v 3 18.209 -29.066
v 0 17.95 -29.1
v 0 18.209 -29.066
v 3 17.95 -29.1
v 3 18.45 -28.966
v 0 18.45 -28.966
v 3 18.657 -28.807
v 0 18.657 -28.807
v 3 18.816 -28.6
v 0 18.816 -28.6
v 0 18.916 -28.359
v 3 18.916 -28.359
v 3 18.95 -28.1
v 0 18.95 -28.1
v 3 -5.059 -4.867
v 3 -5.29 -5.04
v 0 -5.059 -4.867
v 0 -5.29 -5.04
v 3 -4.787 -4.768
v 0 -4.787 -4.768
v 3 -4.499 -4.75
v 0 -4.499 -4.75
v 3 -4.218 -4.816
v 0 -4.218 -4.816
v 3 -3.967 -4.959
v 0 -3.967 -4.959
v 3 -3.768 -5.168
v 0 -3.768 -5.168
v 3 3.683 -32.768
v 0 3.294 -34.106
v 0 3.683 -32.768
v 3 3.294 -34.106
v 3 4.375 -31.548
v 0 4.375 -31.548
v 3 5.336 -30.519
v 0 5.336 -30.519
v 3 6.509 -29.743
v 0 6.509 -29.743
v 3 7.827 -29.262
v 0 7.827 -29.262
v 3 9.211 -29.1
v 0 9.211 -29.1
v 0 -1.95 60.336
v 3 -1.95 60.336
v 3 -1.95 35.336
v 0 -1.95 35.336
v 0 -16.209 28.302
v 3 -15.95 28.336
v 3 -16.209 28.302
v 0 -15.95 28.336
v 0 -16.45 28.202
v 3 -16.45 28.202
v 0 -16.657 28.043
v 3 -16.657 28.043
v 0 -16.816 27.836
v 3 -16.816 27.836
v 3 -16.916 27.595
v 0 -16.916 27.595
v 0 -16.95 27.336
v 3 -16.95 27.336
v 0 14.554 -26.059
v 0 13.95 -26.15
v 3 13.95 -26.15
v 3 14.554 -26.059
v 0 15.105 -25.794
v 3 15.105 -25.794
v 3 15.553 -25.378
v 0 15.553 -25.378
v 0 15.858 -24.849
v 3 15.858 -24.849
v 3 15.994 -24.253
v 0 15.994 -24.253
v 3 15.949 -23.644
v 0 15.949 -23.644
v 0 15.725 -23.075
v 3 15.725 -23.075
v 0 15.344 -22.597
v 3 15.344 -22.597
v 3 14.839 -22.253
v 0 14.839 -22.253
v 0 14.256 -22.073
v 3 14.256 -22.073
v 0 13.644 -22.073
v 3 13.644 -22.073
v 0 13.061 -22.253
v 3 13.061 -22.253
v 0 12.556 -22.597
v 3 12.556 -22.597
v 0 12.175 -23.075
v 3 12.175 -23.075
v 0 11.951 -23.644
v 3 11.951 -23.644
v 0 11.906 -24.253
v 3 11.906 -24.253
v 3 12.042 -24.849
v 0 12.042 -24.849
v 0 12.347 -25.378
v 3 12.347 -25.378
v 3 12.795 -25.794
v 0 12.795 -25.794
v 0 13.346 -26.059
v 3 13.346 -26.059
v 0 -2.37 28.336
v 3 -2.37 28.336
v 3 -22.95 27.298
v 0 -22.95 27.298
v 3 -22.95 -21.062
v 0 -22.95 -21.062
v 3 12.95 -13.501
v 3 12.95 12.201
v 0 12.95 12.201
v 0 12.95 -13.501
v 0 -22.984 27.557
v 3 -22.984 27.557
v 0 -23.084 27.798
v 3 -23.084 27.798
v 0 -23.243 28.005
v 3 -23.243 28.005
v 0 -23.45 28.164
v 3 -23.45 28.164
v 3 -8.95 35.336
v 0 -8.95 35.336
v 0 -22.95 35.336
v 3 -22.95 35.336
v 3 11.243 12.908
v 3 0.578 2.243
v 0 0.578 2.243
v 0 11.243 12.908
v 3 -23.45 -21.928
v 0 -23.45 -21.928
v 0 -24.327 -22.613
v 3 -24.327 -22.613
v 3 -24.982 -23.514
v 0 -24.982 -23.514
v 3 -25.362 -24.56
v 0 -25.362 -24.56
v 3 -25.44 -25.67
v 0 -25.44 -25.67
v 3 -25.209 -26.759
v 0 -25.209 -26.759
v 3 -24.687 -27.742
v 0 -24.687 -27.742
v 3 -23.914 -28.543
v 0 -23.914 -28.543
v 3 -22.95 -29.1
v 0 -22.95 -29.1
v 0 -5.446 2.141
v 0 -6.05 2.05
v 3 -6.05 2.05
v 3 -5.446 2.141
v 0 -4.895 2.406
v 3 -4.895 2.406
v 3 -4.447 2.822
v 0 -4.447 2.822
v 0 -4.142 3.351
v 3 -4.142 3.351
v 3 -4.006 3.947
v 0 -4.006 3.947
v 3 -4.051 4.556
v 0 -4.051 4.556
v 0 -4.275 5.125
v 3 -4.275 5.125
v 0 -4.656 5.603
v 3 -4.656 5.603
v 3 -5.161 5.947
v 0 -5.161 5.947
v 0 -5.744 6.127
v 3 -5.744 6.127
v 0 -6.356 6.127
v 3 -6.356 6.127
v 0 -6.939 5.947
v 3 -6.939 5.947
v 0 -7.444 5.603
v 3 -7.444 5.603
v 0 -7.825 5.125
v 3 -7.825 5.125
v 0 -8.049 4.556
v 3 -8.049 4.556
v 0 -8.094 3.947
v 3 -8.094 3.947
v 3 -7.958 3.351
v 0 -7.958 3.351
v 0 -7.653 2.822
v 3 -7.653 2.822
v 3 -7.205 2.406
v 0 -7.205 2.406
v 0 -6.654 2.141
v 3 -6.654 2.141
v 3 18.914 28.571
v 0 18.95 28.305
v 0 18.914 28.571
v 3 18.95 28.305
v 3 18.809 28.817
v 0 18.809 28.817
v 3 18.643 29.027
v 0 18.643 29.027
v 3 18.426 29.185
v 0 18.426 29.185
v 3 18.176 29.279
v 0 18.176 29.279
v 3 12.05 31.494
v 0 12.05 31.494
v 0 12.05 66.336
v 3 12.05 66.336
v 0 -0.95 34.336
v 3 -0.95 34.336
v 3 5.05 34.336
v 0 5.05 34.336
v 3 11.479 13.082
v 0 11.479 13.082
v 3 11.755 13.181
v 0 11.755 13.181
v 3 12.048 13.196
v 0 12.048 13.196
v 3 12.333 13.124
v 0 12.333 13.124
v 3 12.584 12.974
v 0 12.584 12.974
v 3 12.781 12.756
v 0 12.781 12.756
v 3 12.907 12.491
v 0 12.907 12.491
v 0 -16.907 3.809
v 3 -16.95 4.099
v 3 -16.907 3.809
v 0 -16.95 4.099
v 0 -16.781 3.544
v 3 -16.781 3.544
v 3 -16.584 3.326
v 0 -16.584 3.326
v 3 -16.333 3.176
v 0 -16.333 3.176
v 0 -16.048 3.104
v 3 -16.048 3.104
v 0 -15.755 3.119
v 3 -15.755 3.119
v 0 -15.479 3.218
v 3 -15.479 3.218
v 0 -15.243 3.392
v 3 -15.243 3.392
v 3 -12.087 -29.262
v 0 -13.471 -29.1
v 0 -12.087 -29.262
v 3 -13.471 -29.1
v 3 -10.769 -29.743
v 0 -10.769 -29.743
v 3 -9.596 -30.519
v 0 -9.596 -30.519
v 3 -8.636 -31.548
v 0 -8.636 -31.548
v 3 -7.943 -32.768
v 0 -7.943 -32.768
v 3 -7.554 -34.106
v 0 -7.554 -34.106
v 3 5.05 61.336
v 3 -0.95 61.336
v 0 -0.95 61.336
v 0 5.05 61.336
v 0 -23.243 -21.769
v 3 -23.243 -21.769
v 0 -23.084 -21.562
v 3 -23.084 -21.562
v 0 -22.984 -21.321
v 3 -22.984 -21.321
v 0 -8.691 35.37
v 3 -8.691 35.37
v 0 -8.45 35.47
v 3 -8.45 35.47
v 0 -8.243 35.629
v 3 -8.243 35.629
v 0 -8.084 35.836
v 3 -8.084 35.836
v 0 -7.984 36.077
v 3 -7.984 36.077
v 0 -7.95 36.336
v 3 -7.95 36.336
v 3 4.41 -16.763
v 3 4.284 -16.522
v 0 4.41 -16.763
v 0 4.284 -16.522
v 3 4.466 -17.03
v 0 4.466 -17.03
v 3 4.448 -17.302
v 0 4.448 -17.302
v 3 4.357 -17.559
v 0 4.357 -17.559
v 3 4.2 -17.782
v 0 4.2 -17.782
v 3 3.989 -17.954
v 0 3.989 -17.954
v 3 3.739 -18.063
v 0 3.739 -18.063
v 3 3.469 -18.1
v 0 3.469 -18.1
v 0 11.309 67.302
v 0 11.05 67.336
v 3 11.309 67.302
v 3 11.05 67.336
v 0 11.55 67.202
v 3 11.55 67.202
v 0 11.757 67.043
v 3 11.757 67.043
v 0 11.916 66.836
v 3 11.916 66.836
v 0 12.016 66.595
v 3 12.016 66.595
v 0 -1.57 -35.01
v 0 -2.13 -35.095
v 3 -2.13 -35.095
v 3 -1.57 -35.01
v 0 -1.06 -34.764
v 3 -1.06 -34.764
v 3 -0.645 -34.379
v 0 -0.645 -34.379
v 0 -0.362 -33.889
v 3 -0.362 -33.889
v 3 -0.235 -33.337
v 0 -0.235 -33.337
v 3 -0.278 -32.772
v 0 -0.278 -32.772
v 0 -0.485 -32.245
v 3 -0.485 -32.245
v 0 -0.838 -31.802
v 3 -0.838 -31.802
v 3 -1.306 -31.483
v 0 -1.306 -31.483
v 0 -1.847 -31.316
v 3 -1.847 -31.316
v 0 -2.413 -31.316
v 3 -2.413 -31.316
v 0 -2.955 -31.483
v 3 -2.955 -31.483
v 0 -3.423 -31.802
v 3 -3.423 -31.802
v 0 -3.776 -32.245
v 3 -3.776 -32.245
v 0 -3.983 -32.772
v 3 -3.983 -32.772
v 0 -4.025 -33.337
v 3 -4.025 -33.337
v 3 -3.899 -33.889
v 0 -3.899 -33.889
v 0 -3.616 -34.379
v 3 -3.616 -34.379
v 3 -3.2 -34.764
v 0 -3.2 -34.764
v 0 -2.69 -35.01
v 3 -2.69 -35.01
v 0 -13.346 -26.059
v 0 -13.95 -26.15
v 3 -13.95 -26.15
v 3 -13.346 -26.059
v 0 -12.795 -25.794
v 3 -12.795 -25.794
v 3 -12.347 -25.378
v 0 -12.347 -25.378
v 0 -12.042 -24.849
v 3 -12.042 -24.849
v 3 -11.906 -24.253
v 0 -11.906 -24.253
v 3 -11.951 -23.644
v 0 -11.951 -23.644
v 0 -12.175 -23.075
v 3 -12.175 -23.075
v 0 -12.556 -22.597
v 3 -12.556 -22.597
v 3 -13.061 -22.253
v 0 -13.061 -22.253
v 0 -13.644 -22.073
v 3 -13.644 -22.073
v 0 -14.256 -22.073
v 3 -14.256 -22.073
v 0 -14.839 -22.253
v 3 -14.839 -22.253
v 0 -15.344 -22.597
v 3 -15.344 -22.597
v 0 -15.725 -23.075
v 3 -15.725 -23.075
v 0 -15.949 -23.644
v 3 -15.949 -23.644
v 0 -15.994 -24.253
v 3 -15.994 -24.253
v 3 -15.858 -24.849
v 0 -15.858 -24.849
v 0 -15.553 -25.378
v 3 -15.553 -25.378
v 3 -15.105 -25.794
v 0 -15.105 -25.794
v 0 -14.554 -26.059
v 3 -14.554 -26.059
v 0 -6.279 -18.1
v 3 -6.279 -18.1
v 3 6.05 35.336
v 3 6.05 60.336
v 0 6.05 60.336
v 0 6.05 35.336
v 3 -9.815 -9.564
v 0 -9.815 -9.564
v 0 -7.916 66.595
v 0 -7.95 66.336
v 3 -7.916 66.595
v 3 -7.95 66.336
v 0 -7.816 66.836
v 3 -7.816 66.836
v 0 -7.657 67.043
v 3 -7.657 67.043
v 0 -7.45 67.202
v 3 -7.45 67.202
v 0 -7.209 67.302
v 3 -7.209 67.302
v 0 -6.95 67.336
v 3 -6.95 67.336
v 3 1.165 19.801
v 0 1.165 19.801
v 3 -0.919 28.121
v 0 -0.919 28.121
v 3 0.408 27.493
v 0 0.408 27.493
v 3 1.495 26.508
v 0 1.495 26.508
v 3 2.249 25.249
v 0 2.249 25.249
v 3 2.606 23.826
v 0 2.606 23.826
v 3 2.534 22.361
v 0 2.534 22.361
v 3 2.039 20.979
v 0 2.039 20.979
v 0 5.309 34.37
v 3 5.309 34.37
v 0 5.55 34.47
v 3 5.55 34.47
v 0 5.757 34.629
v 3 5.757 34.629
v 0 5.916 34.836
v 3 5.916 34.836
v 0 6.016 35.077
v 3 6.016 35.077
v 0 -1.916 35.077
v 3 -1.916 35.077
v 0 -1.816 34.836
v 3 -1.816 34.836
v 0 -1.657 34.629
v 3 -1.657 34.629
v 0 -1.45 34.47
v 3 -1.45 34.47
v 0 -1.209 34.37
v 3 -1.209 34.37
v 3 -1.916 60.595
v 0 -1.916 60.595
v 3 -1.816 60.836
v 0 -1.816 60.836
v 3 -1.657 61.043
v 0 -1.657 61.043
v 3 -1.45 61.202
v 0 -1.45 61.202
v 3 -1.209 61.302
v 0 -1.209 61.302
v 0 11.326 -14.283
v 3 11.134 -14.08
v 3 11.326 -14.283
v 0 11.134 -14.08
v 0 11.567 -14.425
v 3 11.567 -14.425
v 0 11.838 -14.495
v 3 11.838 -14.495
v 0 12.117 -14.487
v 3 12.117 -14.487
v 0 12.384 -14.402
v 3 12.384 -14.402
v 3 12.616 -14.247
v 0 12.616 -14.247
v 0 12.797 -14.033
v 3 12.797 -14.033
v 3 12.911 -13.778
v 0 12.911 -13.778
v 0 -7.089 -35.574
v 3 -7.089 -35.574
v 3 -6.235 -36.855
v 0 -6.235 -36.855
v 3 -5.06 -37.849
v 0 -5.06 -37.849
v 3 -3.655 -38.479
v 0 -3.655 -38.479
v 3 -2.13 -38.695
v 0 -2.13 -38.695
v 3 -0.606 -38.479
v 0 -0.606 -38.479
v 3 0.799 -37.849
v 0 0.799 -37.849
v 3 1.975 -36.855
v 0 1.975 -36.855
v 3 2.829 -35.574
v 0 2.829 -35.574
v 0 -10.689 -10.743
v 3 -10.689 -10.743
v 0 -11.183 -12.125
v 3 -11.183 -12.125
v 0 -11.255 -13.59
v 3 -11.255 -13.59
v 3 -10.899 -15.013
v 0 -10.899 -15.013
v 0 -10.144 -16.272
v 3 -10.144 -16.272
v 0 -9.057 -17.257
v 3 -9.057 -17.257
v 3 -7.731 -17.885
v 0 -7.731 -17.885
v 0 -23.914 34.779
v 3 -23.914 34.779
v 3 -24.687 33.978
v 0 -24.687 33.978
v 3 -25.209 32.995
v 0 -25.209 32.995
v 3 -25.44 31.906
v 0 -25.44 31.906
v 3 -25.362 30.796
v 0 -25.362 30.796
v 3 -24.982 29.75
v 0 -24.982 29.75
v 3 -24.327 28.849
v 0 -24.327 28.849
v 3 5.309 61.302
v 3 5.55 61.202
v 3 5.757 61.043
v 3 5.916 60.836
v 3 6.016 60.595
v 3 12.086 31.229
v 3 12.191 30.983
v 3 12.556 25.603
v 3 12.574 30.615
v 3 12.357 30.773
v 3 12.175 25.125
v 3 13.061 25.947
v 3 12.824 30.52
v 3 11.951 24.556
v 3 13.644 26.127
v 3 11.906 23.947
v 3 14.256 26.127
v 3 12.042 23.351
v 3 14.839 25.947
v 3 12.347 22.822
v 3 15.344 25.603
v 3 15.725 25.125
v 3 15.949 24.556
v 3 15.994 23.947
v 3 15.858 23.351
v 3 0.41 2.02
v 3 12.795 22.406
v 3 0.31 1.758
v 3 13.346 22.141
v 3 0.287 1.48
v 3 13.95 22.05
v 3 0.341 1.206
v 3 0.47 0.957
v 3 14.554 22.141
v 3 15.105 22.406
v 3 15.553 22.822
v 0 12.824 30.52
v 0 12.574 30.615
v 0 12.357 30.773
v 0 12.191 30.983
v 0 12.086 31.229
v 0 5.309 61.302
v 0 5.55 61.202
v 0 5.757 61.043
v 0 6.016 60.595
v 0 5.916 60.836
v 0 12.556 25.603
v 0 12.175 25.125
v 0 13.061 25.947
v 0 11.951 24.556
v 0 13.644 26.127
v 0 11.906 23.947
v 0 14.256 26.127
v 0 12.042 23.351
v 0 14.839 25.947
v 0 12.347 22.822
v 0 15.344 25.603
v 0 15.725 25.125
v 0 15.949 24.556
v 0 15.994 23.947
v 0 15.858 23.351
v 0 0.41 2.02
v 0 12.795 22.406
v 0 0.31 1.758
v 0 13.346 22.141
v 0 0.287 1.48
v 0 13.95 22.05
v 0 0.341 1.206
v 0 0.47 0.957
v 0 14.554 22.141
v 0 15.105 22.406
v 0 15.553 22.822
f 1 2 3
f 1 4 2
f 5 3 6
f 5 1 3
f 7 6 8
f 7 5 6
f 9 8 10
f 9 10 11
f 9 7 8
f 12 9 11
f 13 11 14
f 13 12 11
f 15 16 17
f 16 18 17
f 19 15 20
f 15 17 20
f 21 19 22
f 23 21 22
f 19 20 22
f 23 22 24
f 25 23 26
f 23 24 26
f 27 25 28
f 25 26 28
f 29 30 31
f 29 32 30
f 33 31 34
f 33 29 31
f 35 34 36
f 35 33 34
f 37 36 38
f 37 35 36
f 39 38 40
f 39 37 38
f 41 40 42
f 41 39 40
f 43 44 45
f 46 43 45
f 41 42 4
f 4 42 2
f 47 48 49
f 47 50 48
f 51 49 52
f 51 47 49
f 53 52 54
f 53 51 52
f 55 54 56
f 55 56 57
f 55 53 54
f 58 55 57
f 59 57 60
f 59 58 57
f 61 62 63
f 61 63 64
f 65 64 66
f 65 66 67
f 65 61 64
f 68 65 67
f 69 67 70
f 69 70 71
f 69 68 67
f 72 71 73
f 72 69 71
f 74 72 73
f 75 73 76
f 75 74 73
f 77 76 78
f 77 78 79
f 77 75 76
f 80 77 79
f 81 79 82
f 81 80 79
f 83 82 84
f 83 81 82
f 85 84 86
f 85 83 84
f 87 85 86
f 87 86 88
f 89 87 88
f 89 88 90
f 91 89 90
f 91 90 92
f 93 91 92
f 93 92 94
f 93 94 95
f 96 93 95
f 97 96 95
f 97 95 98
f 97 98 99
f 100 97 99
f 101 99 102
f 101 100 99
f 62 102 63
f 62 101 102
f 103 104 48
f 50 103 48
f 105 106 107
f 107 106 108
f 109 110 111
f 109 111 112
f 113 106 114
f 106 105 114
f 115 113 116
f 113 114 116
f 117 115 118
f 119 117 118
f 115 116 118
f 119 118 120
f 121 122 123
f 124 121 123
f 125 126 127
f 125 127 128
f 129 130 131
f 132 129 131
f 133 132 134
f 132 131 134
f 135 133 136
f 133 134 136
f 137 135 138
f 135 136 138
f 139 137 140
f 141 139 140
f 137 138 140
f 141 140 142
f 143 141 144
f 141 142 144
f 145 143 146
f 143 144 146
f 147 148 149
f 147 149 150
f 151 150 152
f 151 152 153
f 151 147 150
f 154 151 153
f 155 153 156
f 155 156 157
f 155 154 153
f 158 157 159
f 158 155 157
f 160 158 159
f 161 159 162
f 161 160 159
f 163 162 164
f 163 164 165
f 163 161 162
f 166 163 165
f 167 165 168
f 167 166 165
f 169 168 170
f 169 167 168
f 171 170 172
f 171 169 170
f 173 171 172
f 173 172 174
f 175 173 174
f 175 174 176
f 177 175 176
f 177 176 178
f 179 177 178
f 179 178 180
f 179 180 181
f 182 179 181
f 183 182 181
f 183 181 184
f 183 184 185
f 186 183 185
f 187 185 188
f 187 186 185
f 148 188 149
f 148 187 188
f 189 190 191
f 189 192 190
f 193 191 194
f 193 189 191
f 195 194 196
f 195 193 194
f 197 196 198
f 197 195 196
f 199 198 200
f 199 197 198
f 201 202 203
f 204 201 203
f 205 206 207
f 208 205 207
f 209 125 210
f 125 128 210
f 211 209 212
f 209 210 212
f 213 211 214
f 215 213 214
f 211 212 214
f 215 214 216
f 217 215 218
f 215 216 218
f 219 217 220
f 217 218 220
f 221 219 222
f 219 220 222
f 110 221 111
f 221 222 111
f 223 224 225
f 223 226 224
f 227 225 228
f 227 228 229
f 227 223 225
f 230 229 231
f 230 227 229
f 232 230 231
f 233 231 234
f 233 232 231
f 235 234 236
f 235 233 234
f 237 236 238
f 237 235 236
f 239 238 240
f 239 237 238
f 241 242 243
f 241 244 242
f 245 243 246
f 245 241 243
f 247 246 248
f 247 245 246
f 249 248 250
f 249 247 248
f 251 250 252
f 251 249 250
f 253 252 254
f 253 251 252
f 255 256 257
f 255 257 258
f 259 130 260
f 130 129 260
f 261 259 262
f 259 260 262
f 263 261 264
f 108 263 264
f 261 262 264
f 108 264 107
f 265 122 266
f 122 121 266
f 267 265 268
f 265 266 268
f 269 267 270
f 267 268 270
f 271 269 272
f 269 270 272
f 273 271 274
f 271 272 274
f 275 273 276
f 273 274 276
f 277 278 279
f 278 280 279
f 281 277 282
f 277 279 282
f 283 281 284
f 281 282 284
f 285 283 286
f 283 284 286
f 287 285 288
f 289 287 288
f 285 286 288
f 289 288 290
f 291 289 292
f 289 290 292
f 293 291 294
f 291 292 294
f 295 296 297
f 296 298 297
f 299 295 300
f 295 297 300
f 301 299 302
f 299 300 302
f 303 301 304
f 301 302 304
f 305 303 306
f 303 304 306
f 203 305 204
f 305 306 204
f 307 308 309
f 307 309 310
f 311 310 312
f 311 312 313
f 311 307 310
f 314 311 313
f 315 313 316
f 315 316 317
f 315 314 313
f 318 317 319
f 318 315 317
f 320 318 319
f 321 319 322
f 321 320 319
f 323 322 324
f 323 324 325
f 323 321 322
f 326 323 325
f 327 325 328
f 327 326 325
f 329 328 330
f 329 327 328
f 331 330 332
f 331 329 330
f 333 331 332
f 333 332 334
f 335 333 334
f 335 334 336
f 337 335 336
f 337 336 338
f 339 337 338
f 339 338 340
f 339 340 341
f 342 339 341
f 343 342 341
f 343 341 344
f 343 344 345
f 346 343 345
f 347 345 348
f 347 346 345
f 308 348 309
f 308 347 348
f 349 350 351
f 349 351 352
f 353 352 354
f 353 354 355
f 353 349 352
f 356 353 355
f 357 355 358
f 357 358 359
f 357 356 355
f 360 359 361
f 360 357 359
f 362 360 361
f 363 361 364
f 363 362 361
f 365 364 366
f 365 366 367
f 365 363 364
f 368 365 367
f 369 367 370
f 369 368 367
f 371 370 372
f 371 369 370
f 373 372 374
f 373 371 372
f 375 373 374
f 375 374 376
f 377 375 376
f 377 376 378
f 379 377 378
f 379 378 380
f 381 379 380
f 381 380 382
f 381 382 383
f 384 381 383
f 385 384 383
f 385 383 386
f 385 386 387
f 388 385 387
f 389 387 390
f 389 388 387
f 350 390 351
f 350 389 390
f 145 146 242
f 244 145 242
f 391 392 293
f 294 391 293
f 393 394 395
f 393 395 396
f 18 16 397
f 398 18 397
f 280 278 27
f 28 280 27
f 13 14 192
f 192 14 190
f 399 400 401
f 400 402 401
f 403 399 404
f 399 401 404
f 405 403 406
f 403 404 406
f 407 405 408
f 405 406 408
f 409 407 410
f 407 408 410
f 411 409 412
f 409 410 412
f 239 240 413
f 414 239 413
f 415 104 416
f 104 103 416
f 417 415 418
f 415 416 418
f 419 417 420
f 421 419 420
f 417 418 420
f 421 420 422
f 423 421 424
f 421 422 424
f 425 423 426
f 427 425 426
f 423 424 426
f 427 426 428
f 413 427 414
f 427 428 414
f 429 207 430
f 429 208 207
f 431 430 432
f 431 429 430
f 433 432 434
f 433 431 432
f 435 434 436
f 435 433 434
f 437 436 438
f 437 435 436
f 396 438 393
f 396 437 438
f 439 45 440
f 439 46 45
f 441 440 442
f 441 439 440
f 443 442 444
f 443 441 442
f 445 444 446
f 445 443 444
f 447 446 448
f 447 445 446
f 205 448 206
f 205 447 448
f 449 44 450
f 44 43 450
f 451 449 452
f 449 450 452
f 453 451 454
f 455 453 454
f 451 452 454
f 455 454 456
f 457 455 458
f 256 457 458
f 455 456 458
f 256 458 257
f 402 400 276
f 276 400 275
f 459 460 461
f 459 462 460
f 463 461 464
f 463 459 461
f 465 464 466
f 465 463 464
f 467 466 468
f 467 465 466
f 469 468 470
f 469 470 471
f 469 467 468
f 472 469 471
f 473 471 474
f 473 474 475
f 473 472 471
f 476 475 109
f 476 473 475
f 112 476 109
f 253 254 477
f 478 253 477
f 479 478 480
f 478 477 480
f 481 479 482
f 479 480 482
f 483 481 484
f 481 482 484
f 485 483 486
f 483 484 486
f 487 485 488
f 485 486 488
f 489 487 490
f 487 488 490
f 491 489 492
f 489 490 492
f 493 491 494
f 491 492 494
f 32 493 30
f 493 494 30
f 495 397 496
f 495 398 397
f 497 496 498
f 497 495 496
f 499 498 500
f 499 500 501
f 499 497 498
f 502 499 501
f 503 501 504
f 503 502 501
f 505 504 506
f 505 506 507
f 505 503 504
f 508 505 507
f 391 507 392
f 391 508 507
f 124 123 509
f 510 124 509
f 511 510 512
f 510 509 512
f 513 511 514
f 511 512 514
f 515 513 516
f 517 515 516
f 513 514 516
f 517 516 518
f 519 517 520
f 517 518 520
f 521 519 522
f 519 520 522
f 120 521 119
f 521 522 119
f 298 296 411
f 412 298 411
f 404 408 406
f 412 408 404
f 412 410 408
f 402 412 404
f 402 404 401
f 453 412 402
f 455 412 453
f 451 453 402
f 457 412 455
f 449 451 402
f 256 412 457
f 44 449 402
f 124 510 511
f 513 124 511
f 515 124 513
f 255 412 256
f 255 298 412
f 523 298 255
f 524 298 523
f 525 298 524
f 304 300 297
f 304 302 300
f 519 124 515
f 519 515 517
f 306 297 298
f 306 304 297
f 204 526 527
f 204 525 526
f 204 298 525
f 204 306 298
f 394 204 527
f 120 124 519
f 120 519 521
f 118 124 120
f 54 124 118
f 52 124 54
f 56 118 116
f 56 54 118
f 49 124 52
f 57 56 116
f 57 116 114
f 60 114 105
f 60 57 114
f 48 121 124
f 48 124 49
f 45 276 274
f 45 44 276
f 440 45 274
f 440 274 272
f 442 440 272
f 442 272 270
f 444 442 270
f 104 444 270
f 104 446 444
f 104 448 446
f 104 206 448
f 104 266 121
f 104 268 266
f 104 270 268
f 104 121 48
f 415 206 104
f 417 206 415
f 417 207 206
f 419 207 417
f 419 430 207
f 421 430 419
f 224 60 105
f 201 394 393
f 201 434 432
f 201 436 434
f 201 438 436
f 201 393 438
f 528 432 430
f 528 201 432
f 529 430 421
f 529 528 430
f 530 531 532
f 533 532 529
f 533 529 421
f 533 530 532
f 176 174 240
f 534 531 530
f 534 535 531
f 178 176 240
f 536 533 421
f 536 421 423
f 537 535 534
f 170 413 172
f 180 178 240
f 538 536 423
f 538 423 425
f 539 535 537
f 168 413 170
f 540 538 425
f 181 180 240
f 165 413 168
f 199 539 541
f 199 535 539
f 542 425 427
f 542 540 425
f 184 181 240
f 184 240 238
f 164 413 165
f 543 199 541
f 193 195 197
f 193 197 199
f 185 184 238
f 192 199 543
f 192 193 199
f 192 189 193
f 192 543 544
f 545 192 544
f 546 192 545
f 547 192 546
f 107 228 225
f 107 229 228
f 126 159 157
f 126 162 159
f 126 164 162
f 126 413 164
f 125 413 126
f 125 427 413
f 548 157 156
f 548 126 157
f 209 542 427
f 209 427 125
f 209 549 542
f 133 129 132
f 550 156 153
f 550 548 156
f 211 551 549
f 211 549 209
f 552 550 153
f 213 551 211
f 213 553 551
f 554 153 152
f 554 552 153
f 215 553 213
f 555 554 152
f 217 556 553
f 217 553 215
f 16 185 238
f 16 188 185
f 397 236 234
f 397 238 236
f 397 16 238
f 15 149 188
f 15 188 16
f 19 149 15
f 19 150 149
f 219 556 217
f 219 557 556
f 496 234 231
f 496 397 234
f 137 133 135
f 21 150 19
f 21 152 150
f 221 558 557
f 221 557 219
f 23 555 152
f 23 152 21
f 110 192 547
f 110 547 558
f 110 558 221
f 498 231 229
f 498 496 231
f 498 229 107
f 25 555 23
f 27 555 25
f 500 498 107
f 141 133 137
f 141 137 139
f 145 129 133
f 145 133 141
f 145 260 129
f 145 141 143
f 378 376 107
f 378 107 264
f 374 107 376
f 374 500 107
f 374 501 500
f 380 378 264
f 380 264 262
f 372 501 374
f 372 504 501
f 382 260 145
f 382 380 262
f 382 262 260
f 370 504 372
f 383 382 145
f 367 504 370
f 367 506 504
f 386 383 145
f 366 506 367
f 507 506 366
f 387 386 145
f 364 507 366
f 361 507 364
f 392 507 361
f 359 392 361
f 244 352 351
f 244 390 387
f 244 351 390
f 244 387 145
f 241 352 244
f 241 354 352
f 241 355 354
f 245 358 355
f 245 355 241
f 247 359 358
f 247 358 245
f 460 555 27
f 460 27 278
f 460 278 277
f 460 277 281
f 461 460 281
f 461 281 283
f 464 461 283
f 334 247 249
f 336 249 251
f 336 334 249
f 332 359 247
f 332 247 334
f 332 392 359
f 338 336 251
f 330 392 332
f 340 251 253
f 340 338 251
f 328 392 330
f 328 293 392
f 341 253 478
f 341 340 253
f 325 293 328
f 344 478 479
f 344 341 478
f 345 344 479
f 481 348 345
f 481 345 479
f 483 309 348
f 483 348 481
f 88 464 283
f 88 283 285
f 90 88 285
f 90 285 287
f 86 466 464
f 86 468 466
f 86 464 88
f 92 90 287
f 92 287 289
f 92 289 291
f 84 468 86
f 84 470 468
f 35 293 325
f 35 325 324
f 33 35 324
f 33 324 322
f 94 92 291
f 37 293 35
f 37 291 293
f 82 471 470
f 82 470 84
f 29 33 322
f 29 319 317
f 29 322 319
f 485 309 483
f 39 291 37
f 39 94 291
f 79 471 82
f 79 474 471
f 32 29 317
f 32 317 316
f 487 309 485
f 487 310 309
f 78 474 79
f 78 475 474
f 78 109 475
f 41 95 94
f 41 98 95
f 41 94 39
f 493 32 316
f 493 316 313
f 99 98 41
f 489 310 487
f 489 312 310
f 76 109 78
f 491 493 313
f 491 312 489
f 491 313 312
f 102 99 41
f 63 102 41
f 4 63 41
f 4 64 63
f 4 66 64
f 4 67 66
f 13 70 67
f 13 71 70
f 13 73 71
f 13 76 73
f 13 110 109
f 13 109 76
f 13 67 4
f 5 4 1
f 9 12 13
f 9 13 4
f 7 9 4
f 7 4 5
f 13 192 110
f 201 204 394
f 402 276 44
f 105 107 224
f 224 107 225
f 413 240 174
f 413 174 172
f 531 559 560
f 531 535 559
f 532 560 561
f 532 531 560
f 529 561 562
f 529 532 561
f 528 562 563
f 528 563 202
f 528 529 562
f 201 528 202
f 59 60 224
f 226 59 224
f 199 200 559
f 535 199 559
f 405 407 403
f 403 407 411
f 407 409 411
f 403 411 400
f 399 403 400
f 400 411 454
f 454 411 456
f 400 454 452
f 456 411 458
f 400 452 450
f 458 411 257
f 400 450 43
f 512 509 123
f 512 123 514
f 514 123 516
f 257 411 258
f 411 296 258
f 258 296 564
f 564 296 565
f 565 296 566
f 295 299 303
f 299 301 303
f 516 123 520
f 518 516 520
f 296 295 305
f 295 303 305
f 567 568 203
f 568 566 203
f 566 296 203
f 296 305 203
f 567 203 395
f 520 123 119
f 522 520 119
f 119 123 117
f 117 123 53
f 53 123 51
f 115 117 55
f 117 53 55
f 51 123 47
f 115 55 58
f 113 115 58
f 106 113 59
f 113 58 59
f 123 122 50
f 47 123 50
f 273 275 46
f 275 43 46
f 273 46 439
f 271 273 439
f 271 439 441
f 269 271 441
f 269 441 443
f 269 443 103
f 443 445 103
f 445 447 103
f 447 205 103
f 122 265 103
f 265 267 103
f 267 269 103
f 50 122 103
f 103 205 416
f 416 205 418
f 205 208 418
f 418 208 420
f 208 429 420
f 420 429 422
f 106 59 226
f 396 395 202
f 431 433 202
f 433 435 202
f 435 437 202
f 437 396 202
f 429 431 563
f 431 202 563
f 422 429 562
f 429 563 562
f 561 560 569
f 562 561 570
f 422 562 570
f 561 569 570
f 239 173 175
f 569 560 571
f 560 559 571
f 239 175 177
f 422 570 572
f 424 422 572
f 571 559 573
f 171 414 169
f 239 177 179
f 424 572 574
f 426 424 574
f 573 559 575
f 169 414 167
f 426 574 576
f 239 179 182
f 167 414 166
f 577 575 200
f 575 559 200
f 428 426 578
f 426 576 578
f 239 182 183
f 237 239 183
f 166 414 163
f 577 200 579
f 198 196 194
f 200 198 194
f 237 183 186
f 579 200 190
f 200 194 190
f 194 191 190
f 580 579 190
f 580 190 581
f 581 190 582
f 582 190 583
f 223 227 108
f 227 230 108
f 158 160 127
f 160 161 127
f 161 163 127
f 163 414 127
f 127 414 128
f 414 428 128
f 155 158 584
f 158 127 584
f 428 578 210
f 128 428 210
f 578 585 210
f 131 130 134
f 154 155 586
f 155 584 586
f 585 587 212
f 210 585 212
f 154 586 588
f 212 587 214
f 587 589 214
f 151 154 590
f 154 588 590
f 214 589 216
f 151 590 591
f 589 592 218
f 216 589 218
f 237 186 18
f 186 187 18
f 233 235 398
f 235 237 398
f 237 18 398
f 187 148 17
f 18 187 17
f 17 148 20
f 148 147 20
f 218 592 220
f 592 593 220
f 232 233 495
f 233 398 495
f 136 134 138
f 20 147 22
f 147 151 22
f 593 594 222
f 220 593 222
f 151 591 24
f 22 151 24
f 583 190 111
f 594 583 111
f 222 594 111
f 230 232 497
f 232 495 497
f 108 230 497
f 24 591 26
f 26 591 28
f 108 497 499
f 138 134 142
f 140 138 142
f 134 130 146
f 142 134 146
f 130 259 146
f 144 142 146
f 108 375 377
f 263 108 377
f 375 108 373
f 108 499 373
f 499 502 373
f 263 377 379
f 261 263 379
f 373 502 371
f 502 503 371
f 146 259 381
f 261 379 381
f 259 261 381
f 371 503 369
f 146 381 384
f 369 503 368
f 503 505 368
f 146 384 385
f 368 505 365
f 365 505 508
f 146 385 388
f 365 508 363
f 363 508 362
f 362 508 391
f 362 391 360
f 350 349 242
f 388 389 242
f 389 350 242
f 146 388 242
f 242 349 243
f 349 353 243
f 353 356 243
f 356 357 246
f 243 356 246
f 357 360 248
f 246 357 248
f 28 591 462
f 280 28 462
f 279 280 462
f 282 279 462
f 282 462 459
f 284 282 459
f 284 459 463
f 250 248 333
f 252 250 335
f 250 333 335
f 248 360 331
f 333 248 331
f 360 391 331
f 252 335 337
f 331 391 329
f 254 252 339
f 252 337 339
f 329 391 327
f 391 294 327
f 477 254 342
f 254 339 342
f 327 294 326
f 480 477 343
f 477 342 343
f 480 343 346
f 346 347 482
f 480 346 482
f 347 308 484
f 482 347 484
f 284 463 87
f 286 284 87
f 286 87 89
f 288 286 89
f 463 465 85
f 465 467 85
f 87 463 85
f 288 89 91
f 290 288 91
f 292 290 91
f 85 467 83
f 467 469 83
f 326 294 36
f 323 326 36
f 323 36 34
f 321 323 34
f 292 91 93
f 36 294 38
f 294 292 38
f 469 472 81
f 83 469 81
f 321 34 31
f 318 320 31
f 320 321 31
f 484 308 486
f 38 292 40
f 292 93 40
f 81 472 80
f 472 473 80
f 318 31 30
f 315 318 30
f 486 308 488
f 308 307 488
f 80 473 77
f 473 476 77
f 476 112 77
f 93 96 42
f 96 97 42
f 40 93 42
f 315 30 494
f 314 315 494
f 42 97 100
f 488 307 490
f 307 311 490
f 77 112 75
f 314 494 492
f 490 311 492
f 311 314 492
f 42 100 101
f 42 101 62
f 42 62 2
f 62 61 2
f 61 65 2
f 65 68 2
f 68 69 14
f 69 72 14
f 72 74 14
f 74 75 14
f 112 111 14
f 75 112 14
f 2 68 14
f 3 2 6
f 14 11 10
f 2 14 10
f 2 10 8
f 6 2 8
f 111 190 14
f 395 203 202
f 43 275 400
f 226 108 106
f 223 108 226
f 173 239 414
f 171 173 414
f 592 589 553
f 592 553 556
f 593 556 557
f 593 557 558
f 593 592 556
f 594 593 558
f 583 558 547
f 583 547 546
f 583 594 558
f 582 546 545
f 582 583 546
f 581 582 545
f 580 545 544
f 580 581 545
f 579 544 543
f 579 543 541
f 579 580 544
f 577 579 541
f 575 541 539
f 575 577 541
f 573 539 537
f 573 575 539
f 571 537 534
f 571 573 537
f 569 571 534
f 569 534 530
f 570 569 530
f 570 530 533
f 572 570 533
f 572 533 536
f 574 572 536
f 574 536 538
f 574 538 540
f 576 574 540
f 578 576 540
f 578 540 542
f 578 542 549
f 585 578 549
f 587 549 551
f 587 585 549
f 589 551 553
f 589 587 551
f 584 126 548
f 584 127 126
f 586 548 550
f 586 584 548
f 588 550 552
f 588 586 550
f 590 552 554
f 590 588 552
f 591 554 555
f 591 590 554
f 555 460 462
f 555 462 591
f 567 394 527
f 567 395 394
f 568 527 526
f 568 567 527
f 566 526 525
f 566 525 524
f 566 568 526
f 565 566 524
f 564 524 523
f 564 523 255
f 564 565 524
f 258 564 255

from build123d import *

# Parameters (mm, degrees)
SKETCH_1_R          = 2.05
SKETCH_1_R_2        = 1.9
EXTRUDE_1_DEPTH     = 3
SKETCH_2_W          = 27
SKETCH_2_H          = 8
CUT_EXTRUDE_1_DEPTH = 3
FILLET_1_R          = 5
FILLET_2_R          = 1
FILLET_3_R          = 6


with BuildPart() as part:
    # 草图1 → 凸台-拉伸1 (new body)
    with BuildSketch(Plane(origin=(0, 0, 0), x_dir=(0, 0, -1), z_dir=(1, 0, 0))):
        with BuildLine():
            Line((29.1, -22.95), (29.1, -7.630182627))
            Line((29.1, -7.630182627), (33.194571076, -7.630182627))
            ThreePointArc((33.194571076, -7.630182627), (38.694571076, -2.130182627), (33.194571076, 3.369817373))
            Line((33.194571076, 3.369817373), (29.1, 3.369817373))
            Line((29.1, 3.369817373), (29.1, 18.95))
            Line((29.1, 18.95), (-29.1, 18.95))
            Line((-29.1, 18.95), (-30.699580381, 12.05))
            Line((-30.699580381, 12.05), (-67.336045252, 12.05))
            Line((-67.336045252, 12.05), (-67.336045252, -7.95))
            Line((-67.336045252, -7.95), (-35.336045252, -7.95))
            Line((-35.336045252, -7.95), (-35.336045252, -22.95))
            ThreePointArc((-35.336045252, -22.95), (-31.627946009, -25.45), (-27.919846765, -22.95))
            Line((-27.919846765, -22.95), (21.683801513, -22.95))
            ThreePointArc((21.683801513, -22.95), (25.391900756, -25.45), (29.1, -22.95))
        make_face()
        with Locations((-24.1, 13.95)):
            Circle(SKETCH_1_R, mode=Mode.SUBTRACT)
        with Locations((24.1, 13.95)):
            Circle(SKETCH_1_R, mode=Mode.SUBTRACT)
        with Locations((24.1, -13.95)):
            Circle(SKETCH_1_R, mode=Mode.SUBTRACT)
        with Locations((-4.1, -6.05)):
            Circle(SKETCH_1_R, mode=Mode.SUBTRACT)
        with Locations((33.194571076, -2.130182627)):
            Circle(SKETCH_1_R_2, mode=Mode.SUBTRACT)
    extrude(amount=EXTRUDE_1_DEPTH)

    # 草图2 → 切除-拉伸1 (cut)
    with BuildSketch(Plane(origin=(3, 0, 0), x_dir=(0, 0, -1), z_dir=(1, 0, 0))):
        Polygon((-28.336045252, 9.700763878), (-28.336045252, -16.95), (-1.685281374, -16.95), align=None)
        with Locations((-47.836045252, 2.05)):
            Rectangle(SKETCH_2_W, SKETCH_2_H)
        Polygon((18.1, 5.403799603), (4.202253287, -4.45275835), (18.1, -18.350505063), align=None)
        Polygon((-14.614718626, 12.95), (16.63985744, 12.95), (-1.646014864, -0.018703762), align=None)
    extrude(amount=-CUT_EXTRUDE_1_DEPTH, mode=Mode.SUBTRACT)

    # 圆角1
    fillet_1_edges = [part.edges().sort_by_distance(p)[0] for p in [
        (1.5, -18.350505063, -18.1),
        (1.5, 9.700763878, 28.336045252),
    ]]
    fillet(fillet_1_edges, radius=FILLET_1_R)

    # 圆角2
    fillet_2_edges = [part.edges().sort_by_distance(p)[0] for p in [
        (1.5, 18.95, 29.1),
        (1.5, 18.95, -29.1),
        (1.5, -22.95, -21.683801513),
        (1.5, -22.95, 27.919846765),
        (1.5, -7.95, 35.336045252),
        (1.5, -7.95, 67.336045252),
        (1.5, 12.05, 67.336045252),
        (1.5, 12.05, 30.699580381),
        (1.5, -1.95, 61.336045252),
        (1.5, 6.05, 61.336045252),
        (1.5, 6.05, 34.336045252),
        (1.5, -1.95, 34.336045252),
        (1.5, -0.018703762, 1.646014864),
        (1.5, 12.95, 14.614718626),
        (1.5, 12.95, -16.63985744),
        (1.5, 5.403799603, -18.1),
        (1.5, -4.45275835, -4.202253287),
        (1.5, -16.95, 1.685281374),
        (1.5, -16.95, 28.336045252),
    ]]
    fillet(fillet_2_edges, radius=FILLET_2_R)

    # 圆角3
    fillet_3_edges = [part.edges().sort_by_distance(p)[0] for p in [
        (1.5, -7.630182627, -29.1),
        (1.5, 3.369817373, -29.1),
    ]]
    fillet(fillet_3_edges, radius=FILLET_3_R)


solid = part.part
